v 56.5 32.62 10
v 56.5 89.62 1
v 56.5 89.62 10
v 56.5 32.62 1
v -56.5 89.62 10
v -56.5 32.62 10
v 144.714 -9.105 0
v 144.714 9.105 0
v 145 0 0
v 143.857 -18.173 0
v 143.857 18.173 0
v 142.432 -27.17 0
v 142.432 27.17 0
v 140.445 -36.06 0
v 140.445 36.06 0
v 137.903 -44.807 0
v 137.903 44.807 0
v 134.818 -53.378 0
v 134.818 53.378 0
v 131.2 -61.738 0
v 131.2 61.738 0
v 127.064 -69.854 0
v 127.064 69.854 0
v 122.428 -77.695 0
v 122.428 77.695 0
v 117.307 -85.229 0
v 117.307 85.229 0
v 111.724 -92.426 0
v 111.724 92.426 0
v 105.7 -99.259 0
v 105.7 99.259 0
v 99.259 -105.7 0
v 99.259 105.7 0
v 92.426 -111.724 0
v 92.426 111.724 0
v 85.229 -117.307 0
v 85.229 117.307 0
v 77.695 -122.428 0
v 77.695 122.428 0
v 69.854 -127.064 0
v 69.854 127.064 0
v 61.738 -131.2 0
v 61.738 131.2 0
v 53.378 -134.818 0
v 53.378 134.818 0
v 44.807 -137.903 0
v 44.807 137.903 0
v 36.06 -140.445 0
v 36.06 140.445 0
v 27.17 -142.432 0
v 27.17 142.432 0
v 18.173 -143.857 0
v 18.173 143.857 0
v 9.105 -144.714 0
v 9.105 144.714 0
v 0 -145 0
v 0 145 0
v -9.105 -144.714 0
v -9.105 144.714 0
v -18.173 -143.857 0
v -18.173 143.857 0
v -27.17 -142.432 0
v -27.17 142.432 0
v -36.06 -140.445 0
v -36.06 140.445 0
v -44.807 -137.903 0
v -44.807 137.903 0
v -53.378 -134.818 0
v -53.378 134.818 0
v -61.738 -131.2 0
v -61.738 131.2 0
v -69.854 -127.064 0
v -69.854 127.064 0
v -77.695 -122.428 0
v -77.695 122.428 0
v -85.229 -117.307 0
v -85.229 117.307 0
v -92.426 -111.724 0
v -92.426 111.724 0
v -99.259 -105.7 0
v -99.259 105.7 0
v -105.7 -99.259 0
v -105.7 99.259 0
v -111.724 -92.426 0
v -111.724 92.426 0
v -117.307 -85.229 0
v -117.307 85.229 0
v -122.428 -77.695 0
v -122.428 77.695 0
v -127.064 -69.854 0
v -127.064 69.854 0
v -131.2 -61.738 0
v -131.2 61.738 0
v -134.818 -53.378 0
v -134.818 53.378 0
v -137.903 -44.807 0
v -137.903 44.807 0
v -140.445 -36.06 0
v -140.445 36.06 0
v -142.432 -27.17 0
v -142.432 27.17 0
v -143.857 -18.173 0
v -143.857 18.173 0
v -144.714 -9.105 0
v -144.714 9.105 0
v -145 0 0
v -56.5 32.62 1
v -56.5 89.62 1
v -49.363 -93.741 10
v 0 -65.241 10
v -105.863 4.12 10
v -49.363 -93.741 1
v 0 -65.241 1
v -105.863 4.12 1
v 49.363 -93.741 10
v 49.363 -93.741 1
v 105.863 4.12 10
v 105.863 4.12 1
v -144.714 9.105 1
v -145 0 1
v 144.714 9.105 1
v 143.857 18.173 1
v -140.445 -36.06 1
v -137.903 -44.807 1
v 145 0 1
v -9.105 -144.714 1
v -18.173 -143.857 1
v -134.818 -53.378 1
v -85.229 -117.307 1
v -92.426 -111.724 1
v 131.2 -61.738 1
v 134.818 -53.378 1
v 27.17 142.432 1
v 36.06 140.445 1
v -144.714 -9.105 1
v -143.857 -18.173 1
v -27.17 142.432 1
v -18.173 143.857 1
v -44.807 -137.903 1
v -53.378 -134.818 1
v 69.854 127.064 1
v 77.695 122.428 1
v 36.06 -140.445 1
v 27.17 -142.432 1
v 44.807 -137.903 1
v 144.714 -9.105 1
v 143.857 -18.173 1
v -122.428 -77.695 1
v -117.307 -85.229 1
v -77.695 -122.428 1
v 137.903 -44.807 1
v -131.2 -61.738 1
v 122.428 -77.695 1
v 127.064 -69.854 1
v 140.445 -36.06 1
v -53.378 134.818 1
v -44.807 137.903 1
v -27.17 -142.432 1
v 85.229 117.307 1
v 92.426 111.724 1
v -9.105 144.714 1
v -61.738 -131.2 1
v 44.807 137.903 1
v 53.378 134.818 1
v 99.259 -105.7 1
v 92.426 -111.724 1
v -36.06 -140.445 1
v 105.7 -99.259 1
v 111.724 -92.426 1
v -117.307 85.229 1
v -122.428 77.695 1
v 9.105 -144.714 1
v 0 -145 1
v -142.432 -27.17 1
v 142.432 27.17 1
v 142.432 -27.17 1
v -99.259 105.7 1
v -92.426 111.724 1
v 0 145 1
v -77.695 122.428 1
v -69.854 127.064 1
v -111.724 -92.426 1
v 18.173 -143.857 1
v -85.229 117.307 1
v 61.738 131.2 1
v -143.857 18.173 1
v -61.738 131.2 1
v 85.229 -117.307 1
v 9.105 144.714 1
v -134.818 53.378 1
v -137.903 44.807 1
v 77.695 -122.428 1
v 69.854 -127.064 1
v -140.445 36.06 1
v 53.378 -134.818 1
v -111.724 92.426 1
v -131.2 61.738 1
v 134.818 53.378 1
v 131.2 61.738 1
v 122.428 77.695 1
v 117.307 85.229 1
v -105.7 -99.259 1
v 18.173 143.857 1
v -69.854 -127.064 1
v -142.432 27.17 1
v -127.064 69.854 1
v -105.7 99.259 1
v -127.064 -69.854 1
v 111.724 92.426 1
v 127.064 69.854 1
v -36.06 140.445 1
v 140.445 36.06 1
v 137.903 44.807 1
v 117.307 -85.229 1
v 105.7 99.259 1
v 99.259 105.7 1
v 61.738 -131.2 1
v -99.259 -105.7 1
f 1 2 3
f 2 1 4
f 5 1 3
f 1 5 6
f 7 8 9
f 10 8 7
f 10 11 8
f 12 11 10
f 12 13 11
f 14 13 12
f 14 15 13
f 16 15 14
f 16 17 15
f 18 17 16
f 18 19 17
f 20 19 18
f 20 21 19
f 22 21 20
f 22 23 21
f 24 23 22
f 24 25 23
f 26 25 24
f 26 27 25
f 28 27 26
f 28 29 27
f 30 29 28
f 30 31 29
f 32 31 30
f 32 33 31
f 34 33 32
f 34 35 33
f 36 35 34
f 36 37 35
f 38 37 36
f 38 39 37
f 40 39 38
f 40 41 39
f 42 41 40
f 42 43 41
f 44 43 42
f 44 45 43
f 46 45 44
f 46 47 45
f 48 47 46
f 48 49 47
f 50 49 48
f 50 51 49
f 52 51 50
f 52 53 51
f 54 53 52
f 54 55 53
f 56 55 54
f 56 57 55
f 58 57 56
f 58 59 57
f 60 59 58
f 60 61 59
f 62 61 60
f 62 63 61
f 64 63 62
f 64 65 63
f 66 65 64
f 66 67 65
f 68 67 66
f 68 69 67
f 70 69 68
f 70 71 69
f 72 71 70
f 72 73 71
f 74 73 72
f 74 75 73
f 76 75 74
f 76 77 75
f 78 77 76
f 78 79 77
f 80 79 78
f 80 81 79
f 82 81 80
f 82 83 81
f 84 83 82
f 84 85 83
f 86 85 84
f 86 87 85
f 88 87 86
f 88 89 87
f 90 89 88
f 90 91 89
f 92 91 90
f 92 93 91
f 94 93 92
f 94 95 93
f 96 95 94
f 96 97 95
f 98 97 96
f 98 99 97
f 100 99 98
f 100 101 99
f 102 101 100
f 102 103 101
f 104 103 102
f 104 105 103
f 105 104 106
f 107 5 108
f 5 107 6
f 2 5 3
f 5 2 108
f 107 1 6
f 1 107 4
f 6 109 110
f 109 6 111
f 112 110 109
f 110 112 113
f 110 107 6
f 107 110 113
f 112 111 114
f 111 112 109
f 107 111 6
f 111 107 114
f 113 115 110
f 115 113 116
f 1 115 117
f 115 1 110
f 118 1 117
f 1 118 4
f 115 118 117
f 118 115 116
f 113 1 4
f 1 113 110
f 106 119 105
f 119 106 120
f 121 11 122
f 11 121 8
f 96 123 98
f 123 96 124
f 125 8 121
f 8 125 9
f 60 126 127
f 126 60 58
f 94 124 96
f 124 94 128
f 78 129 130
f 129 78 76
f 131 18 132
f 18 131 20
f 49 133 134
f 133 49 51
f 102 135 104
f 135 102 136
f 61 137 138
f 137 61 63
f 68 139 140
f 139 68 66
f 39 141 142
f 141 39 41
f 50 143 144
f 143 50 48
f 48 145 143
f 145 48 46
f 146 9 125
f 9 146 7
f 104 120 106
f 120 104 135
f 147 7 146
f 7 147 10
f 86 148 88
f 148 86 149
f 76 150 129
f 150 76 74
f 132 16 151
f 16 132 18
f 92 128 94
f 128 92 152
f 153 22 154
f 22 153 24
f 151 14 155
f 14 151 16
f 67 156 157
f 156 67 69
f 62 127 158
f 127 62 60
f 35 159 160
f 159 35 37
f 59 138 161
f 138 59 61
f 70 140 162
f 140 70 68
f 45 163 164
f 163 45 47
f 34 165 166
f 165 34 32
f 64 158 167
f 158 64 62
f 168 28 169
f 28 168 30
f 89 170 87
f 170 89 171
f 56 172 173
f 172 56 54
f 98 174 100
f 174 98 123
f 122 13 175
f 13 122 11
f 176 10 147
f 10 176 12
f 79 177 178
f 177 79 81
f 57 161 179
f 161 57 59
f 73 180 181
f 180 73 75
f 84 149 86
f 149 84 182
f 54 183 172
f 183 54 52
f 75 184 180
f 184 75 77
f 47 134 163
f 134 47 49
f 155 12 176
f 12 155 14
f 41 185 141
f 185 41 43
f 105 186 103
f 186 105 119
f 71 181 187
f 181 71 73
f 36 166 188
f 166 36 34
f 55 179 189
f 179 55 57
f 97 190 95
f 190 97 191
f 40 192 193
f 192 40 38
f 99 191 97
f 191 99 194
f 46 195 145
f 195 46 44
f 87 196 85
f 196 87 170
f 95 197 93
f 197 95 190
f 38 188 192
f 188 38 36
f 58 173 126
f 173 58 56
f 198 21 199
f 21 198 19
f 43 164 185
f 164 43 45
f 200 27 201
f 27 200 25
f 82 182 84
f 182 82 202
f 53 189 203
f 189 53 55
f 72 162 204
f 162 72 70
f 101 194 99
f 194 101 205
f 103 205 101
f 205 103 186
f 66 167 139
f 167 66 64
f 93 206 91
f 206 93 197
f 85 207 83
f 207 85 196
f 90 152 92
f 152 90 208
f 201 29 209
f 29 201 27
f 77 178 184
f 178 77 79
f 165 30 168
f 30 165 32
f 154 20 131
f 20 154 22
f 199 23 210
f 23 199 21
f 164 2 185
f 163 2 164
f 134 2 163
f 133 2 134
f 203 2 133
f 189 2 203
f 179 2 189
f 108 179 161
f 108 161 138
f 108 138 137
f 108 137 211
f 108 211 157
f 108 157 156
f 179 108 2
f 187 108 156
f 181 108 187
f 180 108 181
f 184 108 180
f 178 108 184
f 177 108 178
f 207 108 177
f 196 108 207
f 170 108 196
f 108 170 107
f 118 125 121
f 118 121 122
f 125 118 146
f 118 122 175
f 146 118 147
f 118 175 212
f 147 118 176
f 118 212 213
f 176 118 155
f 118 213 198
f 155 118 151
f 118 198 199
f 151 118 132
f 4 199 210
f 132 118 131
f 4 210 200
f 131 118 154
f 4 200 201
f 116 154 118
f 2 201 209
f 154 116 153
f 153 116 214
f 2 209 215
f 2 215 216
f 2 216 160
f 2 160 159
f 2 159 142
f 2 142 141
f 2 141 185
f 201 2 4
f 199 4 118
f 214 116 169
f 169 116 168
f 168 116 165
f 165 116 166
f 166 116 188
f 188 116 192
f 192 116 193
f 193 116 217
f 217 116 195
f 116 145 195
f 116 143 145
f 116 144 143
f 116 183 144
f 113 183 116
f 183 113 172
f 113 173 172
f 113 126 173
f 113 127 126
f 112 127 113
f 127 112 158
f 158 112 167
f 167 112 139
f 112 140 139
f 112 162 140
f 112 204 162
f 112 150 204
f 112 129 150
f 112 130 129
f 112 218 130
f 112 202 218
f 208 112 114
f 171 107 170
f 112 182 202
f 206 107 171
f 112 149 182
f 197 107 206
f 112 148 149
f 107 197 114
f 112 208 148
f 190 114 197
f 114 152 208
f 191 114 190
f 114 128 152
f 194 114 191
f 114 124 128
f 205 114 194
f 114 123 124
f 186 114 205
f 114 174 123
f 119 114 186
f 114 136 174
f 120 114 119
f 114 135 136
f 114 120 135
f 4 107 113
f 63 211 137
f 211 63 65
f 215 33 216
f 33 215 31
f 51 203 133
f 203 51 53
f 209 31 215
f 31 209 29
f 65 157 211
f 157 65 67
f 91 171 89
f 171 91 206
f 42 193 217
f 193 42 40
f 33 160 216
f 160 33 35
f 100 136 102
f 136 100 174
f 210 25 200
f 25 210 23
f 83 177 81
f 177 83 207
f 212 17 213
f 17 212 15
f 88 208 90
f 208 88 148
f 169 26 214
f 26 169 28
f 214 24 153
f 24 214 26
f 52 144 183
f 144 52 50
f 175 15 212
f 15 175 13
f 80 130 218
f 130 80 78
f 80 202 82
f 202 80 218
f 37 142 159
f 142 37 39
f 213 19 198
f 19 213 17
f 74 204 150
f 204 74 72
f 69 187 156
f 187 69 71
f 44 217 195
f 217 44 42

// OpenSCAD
// 3 Rectangles arranged in a Symmetric Triangle configuration
// Dimensions: 113mm x 57mm
// Outside circle diameter: 211.89mm
// Wrapped in a 290mm outer circle to show clearance

$fn = 100; // High resolution rendering

// Parameters
rect_l = 113;
rect_w = 57;
inner_side = 113;

// 290mm Reference Bounding Circle
color([0.8, 0.8, 0.8, 0.2]) {
    linear_extrude(height = 1) 
        circle(d = 290);
}



// Distance from center to the inner edge of each rectangle
// For an equilateral triangle of side L, inradius r = L / (2 * sqrt(3))
inradius = inner_side / (2 * sqrt(3)); 

// The 3 Rectangles
for (i = [0 : 2]) {
    rotate([0, 0, i * 120]) {
        // Shift outward so the inner edge touches the inradius,
        // and center it along the side length
        translate([-rect_l/2, inradius, 0]) {
            color([0.2, 0.6, i * 0.4 + 0.2]) {
                cube([rect_l, rect_w, 10]);
            }
        }
    }
}
